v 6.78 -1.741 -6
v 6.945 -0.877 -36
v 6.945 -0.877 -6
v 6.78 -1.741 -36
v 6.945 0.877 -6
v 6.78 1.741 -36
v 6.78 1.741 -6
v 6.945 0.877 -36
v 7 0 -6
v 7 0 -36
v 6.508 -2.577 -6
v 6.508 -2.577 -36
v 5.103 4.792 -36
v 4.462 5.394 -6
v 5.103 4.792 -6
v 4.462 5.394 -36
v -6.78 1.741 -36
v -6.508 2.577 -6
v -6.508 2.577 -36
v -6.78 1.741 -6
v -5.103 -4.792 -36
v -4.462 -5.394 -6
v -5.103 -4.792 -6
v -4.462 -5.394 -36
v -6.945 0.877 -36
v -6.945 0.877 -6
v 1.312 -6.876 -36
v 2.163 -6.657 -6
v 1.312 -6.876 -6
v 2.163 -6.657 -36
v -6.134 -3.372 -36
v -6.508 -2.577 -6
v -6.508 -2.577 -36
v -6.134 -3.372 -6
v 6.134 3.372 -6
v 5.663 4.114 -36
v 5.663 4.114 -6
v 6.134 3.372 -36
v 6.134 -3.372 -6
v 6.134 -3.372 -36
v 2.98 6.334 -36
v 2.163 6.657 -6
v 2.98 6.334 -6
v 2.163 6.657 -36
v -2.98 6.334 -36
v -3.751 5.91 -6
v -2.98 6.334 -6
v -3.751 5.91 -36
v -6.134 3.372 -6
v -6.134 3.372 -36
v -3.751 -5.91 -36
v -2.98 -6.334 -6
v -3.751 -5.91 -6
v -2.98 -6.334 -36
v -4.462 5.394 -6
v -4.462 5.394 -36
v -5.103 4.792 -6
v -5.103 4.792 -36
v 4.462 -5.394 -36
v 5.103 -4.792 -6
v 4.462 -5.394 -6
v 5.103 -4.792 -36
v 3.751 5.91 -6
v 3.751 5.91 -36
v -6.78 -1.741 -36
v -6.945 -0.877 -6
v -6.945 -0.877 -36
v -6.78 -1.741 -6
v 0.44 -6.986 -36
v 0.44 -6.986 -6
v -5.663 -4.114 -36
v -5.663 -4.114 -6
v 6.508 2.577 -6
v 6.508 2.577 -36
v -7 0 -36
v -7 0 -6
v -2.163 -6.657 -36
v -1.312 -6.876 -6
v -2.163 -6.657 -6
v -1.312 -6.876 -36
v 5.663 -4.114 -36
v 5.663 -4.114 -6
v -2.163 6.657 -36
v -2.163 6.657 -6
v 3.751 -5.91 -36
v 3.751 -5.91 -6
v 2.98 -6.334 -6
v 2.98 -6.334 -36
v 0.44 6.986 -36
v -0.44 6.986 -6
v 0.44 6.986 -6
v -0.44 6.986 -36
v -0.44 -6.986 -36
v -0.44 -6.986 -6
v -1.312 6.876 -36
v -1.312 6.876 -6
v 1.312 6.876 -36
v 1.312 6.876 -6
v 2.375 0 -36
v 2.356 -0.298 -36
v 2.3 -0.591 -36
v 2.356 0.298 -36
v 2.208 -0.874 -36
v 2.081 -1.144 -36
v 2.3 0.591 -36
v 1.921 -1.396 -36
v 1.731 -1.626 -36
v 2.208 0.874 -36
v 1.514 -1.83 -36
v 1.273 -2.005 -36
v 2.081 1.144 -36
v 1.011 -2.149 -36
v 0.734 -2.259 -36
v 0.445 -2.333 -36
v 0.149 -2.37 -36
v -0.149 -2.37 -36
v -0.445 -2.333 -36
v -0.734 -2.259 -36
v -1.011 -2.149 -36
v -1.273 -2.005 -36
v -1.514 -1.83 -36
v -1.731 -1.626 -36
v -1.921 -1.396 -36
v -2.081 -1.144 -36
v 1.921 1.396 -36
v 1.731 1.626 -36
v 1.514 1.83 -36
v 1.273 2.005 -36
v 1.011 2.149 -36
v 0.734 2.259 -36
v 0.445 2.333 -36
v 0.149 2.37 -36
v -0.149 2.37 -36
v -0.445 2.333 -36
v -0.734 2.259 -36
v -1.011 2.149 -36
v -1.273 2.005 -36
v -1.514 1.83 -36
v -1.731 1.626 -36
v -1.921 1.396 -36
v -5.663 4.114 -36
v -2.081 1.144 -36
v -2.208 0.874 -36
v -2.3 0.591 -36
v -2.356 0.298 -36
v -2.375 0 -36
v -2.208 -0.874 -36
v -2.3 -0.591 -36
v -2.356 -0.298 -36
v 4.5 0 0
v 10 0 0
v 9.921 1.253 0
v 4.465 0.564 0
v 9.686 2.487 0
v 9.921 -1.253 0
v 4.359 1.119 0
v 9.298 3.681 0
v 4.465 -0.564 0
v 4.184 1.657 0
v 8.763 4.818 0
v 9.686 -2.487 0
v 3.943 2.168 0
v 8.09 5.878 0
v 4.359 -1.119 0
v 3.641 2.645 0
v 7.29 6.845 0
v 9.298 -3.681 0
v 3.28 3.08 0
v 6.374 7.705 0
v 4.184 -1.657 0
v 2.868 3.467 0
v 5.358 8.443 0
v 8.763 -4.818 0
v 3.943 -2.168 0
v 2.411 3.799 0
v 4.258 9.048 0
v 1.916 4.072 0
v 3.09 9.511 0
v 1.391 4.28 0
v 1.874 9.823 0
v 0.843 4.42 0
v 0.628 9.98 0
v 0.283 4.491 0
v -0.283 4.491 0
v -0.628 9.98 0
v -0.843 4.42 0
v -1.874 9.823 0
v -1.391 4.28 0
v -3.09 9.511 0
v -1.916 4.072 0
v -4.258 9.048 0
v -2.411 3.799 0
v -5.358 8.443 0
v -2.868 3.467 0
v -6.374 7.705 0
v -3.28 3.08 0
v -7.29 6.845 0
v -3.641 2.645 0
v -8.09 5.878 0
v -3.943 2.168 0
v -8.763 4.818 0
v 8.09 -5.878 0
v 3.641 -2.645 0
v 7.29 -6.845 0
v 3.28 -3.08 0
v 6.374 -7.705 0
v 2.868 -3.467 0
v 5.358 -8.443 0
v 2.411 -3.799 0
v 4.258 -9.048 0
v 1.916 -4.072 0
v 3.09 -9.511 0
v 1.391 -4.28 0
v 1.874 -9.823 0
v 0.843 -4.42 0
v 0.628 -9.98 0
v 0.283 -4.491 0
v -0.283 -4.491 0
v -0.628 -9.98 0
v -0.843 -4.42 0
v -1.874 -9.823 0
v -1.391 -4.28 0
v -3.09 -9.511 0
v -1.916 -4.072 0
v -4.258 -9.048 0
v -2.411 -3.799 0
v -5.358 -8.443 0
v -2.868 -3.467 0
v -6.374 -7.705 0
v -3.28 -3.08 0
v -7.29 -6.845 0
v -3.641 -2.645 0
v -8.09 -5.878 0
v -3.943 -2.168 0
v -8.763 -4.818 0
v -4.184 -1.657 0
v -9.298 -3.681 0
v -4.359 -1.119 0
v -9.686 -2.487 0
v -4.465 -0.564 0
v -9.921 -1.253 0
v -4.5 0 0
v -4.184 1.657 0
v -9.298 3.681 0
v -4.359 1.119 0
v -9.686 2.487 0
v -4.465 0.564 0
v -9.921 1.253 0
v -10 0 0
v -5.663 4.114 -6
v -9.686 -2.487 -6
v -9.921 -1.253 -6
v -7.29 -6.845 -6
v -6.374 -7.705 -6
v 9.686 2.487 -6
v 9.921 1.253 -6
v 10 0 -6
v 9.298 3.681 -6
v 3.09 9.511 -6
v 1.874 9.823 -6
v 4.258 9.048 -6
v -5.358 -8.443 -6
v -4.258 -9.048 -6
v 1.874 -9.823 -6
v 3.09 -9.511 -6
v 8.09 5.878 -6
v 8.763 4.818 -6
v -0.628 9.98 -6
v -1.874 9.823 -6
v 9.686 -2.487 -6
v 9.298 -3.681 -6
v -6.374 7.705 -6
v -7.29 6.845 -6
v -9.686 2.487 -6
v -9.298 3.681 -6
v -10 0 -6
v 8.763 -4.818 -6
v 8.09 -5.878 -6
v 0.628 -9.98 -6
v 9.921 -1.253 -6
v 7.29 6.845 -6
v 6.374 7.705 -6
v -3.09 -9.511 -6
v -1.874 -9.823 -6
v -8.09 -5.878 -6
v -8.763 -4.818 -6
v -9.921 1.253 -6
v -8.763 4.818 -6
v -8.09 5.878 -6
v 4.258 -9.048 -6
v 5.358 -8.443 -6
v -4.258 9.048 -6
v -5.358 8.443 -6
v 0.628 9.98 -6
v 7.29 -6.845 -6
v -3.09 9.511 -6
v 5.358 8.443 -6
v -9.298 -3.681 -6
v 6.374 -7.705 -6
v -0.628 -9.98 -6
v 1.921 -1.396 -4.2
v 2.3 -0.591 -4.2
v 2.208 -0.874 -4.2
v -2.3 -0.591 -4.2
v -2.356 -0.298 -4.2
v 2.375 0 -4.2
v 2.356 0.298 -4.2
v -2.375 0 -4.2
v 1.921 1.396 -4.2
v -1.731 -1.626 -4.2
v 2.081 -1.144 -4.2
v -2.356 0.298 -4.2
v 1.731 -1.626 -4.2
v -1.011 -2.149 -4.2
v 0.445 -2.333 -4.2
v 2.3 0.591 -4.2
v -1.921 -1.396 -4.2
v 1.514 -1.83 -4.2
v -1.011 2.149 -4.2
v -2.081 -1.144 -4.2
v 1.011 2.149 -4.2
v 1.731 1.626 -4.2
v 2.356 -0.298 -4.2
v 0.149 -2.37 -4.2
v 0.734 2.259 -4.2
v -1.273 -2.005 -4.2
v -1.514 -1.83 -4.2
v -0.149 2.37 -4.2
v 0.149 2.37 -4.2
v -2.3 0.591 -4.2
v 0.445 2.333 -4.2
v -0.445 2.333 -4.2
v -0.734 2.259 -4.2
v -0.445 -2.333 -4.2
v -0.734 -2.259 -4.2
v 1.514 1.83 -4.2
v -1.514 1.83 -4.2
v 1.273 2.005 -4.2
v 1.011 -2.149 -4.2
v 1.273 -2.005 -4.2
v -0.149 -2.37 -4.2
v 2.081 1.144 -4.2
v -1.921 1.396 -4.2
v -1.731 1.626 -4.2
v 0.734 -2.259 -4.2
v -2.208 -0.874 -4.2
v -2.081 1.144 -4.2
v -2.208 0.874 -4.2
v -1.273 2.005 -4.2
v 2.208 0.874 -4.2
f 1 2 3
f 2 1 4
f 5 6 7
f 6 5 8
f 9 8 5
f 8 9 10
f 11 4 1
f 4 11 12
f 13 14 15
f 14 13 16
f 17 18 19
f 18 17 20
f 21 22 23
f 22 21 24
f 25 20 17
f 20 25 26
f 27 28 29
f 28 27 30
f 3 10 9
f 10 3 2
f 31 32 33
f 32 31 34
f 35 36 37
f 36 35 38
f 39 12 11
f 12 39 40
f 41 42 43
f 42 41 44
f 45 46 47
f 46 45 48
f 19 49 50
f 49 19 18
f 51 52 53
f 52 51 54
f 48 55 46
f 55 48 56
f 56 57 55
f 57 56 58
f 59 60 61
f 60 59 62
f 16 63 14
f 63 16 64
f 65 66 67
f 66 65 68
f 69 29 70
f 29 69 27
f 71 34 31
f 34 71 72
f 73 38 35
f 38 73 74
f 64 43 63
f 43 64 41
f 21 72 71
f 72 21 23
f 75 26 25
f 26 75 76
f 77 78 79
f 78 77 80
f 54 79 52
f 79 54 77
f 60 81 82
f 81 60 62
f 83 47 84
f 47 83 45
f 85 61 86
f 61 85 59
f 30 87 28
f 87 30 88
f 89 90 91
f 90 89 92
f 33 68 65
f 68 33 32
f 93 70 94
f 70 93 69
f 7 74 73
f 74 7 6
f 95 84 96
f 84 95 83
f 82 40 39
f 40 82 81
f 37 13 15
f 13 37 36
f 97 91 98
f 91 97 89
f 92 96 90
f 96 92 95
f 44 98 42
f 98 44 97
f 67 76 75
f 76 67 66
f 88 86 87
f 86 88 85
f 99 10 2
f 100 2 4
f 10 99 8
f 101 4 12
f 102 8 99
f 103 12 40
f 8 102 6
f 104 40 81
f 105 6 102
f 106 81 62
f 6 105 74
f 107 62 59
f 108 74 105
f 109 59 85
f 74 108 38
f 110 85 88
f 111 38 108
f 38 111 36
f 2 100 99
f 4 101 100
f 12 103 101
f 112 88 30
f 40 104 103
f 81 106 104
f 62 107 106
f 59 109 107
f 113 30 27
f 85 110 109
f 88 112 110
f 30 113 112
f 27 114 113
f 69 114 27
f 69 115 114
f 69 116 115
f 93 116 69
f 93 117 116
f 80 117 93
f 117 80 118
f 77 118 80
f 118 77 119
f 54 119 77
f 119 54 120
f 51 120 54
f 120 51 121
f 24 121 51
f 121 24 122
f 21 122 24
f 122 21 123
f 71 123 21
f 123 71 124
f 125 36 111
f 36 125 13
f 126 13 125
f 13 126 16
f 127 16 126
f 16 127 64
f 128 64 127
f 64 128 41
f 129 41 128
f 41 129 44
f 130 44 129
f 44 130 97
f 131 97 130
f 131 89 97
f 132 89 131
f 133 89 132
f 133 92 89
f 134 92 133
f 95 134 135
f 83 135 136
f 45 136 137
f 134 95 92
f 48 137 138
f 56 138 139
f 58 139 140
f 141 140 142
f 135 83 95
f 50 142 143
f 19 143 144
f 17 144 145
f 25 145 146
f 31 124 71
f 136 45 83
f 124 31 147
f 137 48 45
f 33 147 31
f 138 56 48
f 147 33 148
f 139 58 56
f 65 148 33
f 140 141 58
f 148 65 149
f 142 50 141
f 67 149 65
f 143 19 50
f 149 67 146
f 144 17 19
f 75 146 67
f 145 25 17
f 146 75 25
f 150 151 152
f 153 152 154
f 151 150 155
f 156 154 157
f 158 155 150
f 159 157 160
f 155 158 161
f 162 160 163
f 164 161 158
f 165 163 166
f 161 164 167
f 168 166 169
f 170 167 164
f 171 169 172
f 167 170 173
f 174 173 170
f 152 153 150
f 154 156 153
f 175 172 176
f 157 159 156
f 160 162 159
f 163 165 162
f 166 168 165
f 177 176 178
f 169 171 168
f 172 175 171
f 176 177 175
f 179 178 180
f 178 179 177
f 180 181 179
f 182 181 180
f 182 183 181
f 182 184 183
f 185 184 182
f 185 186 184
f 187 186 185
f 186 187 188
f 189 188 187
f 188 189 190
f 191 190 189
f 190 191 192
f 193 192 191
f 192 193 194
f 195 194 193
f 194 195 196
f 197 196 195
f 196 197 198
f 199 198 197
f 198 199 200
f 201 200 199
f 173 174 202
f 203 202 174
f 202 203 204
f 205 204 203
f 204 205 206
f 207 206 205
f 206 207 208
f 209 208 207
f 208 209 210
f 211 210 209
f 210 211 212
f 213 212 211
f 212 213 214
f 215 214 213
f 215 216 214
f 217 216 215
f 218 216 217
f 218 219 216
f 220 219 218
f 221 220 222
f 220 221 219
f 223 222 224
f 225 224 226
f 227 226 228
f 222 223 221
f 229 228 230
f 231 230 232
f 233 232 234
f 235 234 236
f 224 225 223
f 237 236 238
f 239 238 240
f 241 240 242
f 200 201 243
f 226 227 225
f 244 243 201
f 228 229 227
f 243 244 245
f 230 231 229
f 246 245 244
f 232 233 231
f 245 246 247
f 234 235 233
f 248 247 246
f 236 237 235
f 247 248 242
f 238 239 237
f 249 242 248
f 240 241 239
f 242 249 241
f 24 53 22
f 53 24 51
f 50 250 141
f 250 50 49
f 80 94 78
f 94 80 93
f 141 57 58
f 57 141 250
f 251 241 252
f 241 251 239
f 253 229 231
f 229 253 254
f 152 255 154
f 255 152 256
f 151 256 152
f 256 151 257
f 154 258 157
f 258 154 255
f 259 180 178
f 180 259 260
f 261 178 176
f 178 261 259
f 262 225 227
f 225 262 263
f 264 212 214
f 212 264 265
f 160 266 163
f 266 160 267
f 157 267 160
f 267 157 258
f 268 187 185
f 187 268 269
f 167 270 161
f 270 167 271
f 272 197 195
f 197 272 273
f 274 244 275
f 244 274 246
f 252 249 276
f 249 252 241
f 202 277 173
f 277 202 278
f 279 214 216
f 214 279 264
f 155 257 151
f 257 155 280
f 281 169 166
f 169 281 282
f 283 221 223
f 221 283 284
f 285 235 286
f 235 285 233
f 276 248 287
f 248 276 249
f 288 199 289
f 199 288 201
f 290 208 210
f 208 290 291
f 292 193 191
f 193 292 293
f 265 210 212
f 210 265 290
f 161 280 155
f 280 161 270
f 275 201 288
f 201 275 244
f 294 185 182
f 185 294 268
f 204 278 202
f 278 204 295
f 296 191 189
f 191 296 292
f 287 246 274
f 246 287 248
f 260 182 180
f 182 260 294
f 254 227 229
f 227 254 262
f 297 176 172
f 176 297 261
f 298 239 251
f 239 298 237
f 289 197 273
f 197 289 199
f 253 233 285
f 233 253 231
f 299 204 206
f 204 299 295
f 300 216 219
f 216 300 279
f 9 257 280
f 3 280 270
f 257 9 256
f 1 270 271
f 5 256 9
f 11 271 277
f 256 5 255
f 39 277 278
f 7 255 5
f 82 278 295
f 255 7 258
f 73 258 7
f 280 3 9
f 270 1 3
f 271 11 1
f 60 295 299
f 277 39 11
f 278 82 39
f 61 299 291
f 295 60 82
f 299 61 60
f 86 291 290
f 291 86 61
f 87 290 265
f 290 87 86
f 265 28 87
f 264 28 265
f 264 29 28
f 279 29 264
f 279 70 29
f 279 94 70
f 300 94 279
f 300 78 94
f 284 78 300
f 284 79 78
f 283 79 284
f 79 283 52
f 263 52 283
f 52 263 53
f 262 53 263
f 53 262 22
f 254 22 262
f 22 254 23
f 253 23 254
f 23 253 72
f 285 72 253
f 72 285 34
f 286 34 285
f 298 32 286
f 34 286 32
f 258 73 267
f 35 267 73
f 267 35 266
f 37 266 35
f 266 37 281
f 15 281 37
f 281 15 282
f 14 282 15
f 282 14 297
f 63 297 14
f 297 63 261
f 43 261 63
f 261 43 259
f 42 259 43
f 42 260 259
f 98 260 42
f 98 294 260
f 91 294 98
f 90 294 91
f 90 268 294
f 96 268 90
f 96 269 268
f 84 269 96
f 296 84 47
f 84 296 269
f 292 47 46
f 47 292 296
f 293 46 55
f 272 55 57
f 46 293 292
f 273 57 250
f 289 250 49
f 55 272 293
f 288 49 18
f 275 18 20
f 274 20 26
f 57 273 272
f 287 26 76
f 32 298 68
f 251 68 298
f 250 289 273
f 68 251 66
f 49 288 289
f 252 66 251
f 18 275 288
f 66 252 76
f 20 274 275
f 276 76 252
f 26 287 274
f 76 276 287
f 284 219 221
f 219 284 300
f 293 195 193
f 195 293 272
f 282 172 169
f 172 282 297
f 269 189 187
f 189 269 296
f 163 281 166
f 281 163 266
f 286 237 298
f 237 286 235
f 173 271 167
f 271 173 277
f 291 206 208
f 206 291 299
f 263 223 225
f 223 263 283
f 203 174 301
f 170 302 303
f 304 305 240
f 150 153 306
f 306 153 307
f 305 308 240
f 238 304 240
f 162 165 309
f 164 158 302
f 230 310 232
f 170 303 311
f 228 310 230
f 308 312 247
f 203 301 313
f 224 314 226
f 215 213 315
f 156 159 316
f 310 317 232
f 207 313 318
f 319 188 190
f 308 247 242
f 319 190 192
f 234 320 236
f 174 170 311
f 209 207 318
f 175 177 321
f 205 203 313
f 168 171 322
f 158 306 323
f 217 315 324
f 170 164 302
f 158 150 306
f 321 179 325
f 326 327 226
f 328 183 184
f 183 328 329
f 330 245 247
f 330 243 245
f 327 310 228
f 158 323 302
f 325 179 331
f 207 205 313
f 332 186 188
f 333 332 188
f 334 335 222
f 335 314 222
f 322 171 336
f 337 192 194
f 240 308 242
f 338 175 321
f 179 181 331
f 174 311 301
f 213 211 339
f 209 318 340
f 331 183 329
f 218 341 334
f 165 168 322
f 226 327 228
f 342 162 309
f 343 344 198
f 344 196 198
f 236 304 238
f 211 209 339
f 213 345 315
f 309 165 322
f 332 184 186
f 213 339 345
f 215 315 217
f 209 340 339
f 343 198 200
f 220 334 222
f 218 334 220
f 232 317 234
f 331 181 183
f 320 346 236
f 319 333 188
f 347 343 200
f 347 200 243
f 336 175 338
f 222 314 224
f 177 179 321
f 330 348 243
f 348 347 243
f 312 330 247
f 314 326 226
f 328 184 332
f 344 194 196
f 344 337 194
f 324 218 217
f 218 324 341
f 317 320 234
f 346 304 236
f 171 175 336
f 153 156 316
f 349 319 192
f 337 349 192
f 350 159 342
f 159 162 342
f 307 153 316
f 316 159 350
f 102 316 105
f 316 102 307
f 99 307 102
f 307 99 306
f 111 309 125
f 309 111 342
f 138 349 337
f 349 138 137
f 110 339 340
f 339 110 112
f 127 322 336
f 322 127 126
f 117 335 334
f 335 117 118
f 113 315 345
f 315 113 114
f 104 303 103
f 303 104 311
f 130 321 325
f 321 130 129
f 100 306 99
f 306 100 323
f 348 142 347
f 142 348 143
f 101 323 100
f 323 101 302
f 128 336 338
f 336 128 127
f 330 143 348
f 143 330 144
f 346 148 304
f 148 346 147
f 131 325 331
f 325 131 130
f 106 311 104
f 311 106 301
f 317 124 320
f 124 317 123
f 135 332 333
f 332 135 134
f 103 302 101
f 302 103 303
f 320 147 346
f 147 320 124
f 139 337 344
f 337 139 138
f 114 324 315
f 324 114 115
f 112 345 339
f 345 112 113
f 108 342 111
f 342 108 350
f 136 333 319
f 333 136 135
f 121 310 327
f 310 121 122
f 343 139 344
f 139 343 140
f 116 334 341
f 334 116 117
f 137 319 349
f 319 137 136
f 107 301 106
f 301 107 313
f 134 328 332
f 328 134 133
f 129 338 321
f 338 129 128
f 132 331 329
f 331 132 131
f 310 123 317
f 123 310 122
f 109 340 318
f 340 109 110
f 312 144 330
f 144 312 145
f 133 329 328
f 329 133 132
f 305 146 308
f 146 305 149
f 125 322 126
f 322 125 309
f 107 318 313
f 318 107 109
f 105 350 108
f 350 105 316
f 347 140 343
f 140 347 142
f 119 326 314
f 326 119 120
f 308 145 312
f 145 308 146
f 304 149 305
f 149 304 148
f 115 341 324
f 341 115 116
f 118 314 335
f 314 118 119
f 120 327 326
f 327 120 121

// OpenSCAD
$fn = 50;


difference() {
	union() {
		translate(v = [0, 0, -36.0000000000]) {
			cylinder(h = 36, r = 7.0000000000);
		}
		translate(v = [0, 0, -6.0000000000]) {
			cylinder(h = 6, r = 10.0000000000);
		}
	}
	union() {
		translate(v = [0, 0, 0]) {
			rotate(a = [0, 0, 0]) {
				difference() {
					union() {
						#translate(v = [0, 0, -36.0000000000]) {
							cylinder(h = 36, r = 2.2500000000);
						}
						#translate(v = [0, 0, -4.2000000000]) {
							cylinder(h = 4.2000000000, r1 = 2.3750000000, r2 = 4.5000000000);
						}
						#translate(v = [0, 0, -36.0000000000]) {
							cylinder(h = 36, r = 2.3750000000);
						}
						#translate(v = [0, 0, -36.0000000000]) {
							cylinder(h = 36, r = 2.2500000000);
						}
					}
					union();
				}
			}
		}
	}
}
